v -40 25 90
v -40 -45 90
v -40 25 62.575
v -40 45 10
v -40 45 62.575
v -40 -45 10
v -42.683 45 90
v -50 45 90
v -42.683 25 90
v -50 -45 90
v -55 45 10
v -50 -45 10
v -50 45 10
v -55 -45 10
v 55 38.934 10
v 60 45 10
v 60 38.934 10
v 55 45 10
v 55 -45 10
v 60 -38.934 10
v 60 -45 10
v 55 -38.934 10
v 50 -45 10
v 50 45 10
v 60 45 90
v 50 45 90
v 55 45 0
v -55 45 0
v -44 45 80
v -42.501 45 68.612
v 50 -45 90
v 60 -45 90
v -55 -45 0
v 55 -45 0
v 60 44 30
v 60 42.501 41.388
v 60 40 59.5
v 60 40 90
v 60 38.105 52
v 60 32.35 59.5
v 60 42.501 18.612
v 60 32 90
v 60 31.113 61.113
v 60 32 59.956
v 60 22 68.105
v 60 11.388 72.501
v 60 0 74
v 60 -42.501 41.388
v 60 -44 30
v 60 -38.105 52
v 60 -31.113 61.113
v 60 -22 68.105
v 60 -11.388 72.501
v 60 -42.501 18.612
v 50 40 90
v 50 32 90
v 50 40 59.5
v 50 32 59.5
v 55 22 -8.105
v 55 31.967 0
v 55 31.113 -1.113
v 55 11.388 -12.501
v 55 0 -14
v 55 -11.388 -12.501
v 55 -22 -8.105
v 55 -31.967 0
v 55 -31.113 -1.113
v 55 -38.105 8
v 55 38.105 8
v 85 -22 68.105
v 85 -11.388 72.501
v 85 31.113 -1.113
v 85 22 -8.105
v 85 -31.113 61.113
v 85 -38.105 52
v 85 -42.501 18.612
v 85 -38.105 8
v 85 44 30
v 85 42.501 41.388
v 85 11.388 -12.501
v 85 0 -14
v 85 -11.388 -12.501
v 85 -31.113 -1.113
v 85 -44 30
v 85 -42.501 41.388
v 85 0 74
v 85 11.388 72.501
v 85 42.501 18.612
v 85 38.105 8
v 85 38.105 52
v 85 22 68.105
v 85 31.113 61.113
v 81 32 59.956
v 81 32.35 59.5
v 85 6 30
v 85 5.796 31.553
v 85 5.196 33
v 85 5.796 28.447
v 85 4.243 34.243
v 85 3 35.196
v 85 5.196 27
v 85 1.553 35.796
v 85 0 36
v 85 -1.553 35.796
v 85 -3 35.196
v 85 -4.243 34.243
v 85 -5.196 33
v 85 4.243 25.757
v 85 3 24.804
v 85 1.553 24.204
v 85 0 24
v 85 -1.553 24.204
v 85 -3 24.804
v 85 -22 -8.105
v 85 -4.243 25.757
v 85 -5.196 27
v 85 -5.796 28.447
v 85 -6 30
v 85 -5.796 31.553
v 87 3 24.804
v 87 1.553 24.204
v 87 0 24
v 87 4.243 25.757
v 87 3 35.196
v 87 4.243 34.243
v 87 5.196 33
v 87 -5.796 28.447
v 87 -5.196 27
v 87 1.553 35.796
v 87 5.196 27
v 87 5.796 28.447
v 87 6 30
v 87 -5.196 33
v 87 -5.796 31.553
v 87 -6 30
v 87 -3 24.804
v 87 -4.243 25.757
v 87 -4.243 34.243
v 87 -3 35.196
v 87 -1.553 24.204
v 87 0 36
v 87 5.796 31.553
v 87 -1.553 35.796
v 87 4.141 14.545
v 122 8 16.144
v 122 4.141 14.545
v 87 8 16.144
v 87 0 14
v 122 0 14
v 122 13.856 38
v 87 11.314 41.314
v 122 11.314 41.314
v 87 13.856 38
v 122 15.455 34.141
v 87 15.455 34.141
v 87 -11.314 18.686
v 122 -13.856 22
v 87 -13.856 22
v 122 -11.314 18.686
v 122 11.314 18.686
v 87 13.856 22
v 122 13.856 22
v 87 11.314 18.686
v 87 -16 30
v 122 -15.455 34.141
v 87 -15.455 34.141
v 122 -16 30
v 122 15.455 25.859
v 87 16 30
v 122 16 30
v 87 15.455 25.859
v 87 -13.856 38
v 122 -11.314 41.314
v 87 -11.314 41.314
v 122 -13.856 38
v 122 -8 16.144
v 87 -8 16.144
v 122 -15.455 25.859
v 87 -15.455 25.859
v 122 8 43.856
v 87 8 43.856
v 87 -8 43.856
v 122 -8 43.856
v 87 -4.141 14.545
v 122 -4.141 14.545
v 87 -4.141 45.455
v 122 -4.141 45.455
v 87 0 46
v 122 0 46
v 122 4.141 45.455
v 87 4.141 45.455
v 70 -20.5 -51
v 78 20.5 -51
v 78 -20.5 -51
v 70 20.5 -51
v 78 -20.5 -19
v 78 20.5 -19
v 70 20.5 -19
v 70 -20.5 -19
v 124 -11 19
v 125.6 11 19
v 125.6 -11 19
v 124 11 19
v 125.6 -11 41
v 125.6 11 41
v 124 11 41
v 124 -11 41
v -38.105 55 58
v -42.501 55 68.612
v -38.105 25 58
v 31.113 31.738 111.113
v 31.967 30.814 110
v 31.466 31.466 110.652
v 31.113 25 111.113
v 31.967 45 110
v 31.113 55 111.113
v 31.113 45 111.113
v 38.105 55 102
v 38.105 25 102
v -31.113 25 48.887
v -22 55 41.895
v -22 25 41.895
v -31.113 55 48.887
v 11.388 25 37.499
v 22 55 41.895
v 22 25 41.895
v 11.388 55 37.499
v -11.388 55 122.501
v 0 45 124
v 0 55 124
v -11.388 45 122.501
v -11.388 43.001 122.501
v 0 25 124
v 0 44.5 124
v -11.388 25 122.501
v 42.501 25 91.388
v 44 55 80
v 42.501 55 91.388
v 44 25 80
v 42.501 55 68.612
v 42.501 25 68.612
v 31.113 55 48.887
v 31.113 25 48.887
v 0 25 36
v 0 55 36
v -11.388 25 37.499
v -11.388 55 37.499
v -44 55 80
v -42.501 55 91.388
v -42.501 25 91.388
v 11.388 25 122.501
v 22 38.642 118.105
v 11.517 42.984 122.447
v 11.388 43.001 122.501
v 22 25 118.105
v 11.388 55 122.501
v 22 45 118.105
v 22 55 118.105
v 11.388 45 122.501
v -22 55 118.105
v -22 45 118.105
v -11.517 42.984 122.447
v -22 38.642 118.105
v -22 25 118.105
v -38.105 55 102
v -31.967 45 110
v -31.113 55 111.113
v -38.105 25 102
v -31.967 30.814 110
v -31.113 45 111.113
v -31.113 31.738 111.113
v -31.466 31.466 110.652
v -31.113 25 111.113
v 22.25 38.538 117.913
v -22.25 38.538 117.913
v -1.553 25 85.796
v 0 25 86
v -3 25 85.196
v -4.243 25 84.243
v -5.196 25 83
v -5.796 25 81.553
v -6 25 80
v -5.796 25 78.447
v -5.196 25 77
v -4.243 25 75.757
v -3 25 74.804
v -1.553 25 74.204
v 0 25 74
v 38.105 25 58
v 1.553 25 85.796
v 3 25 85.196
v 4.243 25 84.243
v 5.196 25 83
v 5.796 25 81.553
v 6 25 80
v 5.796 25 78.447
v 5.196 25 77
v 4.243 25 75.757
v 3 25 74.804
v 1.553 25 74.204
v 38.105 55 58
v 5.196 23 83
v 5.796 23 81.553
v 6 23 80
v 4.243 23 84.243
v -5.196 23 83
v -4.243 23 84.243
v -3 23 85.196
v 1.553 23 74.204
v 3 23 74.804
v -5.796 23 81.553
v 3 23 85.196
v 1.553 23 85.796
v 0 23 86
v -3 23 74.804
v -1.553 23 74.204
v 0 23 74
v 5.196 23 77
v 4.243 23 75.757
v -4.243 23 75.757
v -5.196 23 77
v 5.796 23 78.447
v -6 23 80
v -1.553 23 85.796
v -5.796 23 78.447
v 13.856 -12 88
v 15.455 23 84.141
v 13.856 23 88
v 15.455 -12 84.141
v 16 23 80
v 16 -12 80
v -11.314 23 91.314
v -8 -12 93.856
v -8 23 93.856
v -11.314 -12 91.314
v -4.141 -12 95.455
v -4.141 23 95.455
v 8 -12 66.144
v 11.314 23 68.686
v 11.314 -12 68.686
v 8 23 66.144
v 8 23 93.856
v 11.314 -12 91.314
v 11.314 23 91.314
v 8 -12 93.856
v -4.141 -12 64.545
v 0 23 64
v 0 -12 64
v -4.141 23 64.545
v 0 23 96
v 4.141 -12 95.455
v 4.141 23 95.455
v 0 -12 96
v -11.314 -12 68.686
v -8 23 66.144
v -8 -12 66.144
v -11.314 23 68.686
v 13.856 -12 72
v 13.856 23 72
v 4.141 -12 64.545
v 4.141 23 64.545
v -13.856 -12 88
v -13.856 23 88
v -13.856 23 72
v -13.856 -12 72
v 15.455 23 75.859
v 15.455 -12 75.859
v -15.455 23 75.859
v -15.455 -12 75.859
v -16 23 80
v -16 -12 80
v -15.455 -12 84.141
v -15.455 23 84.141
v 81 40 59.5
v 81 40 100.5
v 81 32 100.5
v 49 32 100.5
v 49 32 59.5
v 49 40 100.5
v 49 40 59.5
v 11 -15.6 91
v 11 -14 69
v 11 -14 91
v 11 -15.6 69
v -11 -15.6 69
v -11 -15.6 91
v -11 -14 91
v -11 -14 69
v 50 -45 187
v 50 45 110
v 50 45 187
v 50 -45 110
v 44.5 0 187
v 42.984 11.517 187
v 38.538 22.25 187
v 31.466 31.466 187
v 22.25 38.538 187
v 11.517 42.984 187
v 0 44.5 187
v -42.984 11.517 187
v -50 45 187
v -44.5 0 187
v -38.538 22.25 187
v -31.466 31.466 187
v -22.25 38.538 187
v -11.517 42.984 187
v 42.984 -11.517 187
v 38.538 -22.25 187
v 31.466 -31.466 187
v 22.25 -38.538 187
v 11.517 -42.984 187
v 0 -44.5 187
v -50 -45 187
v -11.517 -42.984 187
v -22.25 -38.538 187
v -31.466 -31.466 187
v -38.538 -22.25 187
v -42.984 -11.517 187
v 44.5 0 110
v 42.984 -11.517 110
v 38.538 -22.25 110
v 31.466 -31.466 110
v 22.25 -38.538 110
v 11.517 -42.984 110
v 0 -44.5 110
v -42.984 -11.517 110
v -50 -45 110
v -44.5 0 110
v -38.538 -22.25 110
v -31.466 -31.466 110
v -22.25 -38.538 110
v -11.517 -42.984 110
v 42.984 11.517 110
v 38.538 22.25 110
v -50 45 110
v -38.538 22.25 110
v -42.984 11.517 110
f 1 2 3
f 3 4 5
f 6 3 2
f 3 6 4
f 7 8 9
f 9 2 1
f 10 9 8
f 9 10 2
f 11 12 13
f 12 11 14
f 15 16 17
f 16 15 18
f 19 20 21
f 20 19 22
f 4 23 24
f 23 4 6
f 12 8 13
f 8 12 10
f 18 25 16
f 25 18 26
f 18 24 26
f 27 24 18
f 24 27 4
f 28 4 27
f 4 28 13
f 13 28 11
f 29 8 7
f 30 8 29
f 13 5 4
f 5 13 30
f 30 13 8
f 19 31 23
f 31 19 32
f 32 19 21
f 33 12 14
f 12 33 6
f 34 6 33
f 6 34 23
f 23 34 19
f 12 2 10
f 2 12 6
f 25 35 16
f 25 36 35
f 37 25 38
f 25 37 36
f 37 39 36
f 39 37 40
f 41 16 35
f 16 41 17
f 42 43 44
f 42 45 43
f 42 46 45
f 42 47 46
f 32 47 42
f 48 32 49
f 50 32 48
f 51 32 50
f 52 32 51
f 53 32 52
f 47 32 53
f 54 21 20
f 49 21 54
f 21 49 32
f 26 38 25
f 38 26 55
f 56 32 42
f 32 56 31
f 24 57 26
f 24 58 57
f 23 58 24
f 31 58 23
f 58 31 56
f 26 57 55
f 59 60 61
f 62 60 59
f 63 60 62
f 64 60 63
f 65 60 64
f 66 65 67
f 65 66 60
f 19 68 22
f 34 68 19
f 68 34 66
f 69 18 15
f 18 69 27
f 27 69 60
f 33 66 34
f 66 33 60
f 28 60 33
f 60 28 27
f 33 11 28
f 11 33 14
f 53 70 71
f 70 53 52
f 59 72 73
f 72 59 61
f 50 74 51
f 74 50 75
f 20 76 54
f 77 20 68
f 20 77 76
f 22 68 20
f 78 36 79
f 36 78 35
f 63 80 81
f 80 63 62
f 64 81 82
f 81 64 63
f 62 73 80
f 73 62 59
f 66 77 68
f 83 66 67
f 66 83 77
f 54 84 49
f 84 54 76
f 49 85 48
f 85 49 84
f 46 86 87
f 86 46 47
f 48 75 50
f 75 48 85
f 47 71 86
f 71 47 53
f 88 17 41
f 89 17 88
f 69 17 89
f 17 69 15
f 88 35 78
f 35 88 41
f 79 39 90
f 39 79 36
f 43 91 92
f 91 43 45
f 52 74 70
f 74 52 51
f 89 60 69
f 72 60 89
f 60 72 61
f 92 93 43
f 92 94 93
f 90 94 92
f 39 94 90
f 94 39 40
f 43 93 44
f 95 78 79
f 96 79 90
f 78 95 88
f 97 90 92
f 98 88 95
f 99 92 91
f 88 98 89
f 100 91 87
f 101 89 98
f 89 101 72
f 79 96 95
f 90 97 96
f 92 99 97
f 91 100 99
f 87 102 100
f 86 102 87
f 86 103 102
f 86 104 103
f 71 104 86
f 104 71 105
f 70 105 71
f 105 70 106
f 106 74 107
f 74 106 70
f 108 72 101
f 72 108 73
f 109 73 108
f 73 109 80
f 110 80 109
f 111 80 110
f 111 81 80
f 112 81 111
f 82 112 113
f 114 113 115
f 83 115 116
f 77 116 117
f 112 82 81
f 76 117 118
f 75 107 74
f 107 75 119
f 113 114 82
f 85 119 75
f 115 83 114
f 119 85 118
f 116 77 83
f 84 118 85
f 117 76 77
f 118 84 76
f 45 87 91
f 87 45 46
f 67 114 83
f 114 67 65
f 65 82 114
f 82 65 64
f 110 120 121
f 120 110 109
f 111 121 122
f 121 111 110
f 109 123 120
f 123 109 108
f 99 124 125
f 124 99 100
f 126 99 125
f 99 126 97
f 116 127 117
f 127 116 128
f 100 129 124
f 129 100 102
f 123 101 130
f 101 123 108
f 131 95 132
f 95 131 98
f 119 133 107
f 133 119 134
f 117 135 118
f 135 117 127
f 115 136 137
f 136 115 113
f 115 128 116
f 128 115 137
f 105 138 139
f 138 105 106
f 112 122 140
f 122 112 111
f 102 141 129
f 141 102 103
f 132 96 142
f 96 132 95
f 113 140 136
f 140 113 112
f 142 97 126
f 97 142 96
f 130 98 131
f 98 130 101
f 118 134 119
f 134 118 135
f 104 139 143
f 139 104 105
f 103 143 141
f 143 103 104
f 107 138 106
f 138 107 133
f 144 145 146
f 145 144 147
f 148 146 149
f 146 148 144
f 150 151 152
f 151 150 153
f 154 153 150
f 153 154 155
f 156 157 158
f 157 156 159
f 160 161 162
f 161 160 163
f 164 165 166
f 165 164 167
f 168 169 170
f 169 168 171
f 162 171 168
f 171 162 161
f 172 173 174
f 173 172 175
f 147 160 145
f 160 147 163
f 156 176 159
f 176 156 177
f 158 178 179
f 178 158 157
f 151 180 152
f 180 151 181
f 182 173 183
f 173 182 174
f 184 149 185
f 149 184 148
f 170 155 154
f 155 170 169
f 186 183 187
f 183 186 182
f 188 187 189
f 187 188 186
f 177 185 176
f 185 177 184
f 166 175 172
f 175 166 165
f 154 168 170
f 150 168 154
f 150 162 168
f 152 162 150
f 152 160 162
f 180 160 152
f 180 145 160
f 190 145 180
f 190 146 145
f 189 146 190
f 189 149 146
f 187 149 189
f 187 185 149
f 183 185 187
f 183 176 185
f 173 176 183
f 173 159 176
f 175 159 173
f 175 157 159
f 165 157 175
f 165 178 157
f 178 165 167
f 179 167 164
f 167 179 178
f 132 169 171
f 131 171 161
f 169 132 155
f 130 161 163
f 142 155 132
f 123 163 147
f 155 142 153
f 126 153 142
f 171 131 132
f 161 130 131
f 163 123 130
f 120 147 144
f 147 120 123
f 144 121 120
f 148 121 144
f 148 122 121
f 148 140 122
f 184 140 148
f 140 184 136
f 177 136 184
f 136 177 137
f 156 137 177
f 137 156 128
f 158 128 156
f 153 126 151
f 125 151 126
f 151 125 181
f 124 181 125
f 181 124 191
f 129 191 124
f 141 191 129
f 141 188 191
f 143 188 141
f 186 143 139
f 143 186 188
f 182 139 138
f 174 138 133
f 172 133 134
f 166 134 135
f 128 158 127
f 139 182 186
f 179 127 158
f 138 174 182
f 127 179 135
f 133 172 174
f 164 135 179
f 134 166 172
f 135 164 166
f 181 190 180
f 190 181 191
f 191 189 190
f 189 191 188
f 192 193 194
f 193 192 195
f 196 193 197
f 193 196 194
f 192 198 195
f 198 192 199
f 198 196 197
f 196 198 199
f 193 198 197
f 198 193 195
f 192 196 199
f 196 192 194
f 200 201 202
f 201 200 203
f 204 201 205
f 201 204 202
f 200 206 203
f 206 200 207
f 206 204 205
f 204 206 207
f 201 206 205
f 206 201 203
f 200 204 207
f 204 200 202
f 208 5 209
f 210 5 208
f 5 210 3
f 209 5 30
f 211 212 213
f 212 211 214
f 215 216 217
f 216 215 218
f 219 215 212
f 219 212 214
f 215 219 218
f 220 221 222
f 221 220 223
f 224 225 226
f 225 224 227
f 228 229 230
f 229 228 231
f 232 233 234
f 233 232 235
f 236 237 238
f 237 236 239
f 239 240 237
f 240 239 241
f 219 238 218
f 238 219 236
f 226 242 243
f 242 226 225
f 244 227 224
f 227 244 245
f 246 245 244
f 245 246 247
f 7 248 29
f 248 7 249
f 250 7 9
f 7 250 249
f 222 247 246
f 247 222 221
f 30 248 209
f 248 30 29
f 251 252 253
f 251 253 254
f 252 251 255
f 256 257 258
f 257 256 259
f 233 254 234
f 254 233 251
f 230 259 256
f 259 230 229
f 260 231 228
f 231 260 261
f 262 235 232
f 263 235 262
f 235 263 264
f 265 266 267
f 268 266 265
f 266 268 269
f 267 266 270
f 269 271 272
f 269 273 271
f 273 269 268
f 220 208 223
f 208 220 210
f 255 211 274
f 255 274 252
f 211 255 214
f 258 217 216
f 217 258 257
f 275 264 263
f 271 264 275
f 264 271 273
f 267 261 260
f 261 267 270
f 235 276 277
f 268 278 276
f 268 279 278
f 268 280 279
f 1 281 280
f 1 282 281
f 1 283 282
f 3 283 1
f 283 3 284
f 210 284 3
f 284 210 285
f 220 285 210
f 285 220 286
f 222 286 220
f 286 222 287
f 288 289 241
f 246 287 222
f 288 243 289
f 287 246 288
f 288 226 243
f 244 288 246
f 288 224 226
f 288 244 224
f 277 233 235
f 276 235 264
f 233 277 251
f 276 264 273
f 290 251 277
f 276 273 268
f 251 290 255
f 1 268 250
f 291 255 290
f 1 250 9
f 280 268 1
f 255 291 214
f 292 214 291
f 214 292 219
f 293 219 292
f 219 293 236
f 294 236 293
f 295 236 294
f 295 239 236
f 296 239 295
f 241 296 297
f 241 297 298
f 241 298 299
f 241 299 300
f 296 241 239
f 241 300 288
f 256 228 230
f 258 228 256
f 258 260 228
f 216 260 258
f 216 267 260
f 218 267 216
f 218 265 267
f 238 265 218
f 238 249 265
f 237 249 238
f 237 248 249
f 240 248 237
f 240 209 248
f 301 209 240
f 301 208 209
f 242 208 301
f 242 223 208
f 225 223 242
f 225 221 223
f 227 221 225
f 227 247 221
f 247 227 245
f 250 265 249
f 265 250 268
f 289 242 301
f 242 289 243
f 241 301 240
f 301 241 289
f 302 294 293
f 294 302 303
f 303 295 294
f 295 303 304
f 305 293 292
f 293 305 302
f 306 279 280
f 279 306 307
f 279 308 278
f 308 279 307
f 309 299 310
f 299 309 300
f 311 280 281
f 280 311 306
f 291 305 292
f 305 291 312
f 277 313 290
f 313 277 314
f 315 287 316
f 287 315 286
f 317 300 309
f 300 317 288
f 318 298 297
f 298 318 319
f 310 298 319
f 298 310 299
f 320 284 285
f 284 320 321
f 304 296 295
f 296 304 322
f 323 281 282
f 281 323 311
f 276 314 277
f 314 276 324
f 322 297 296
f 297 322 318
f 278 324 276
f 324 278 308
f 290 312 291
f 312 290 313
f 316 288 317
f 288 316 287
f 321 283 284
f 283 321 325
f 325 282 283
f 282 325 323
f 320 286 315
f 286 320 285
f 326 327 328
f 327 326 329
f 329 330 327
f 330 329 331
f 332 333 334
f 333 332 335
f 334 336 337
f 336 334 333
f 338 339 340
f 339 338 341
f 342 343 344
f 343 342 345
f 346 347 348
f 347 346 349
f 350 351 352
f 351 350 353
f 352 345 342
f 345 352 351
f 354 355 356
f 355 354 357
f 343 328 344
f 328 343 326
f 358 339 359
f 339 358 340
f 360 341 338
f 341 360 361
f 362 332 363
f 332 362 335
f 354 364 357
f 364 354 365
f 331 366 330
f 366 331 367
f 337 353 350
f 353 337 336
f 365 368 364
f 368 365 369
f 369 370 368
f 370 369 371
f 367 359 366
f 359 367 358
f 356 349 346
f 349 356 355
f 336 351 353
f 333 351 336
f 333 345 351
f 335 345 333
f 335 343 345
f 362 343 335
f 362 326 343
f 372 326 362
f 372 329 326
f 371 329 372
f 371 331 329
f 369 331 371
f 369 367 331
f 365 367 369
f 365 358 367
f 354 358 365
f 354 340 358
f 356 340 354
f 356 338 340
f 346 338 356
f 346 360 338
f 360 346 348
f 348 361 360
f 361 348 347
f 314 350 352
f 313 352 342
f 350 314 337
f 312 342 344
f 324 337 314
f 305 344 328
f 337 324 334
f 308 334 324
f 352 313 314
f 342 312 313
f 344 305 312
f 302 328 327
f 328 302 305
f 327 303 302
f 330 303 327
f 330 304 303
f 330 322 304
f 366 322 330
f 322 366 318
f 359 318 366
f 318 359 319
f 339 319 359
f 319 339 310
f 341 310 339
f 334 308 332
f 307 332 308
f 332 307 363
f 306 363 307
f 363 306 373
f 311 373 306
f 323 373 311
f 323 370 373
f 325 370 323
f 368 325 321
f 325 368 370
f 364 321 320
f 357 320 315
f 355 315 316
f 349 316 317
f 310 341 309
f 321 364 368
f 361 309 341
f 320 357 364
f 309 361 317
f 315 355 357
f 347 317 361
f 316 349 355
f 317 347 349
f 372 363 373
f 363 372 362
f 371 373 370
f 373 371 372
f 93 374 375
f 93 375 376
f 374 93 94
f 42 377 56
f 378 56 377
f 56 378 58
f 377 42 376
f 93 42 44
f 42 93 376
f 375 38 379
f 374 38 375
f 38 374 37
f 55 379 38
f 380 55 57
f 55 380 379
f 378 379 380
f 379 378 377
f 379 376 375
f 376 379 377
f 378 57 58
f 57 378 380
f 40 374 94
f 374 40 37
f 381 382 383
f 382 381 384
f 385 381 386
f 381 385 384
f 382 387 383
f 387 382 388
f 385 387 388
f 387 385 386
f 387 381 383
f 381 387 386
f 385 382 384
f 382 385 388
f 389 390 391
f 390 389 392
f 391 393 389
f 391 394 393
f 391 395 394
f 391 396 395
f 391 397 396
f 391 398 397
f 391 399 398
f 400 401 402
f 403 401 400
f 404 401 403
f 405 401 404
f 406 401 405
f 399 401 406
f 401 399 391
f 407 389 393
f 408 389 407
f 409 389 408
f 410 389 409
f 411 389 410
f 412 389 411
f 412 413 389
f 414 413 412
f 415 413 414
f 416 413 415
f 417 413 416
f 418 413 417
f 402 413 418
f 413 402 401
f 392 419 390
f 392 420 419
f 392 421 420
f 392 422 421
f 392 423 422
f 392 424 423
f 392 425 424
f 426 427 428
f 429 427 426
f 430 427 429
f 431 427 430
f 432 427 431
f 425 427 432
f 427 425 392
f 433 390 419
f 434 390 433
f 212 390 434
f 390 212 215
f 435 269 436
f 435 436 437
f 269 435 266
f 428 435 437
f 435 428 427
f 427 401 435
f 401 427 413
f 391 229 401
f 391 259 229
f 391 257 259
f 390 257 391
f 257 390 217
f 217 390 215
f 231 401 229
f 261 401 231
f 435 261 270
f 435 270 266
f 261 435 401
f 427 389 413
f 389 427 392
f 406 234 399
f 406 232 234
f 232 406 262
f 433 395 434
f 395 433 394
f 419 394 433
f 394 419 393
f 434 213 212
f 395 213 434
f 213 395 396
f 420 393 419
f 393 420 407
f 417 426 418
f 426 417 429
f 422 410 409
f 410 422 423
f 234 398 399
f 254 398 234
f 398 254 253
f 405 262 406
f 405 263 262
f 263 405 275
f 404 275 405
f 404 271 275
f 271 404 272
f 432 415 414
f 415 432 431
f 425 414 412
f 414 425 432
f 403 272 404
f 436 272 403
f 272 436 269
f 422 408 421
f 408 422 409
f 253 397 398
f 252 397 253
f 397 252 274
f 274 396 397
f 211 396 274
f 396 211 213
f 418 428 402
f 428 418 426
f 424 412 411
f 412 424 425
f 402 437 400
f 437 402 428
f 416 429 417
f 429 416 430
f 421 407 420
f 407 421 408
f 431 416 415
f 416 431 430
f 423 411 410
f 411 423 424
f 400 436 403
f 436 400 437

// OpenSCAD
// ankle.scad
// Free Humanoid Platform — Leg v0.1 — ankle 2-DoF QDD stack
//
// Serial 2-DoF cluster: pitch (sagittal) → roll (frontal). Each axis is a
// quasi-direct-drive (QDD) actuator: T-Motor U8 Lite KV150 outrunner BLDC
// (BOM ankle_*_qdd_motor) + Maxon GP 32 HP single-stage planetary 6.6:1
// (BOM ankle_*_qdd_planetary) + Moteus c1 (BOM ankle_*_controller) +
// AS5048A position sensor.
//
// Corpus: mini-cheetah (2019), cassie-osu, mit-cheetah-2 (2014).
// REFERENCE GEOMETRY — NOT VALIDATED BY PHYSICAL BUILD.

include <leg_params.scad>;

// --------------------------------------------------------------------------
// qdd_motor_envelope() — T-Motor U8 Lite outrunner (pancake form)
// --------------------------------------------------------------------------
module qdd_motor_envelope() {
    color("DarkOliveGreen")
        cylinder(h = qdd_motor_length, d = qdd_motor_od, center = false);
    // Output shaft
    color("Goldenrod")
        translate([0, 0, qdd_motor_length])
            cylinder(h = 8.0, d = qdd_motor_shaft_d, center = false);
}

// --------------------------------------------------------------------------
// qdd_planetary_envelope() — Maxon GP 32 HP 6.6:1
// --------------------------------------------------------------------------
module qdd_planetary_envelope() {
    color("DarkSlateGray")
        cylinder(h = qdd_planetary_length, d = qdd_planetary_od,
                  center = false);
}

// --------------------------------------------------------------------------
// moteus_c1_envelope() — small box on housing
// --------------------------------------------------------------------------
module moteus_c1_envelope() {
    color("ForestGreen")
        cube([moteus_c1_w, moteus_c1_l, moteus_c1_h], center = false);
}

// --------------------------------------------------------------------------
// ankle_pitch_housing() — milled aluminum 6061 (BOM ankle_pitch_housing)
// --------------------------------------------------------------------------
module ankle_pitch_housing() {
    color("Silver", 0.4)
    difference() {
        // Outer shell (rectangular bracket form)
        translate([-50, -45, 0])
            cube([100, 90, qdd_motor_length + qdd_planetary_length + 12]);
        // Hollow for motor + planetary
        translate([0, 0, -0.1])
            cylinder(h = qdd_motor_length + qdd_planetary_length + 12.2,
                     d = qdd_motor_od + 1.0, center = false);
    }
}

// --------------------------------------------------------------------------
// ankle_roll_yoke() — U-shape yoke (BOM ankle_roll_housing)
// --------------------------------------------------------------------------
module ankle_roll_yoke() {
    yoke_w = 110.0;
    yoke_l = 90.0;
    yoke_t = 10.0;
    arm_h  = qdd_motor_length + qdd_planetary_length + 15.0;

    color("Silver", 0.5)
    union() {
        // Bottom plate (mates to FT sensor / foot plate)
        translate([-yoke_w / 2, -yoke_l / 2, 0])
            cube([yoke_w, yoke_l, yoke_t]);
        // Two side arms (vertical), each holding one bearing for the
        // pitch-axis rotation
        for (sx = [-1, 1]) {
            translate([sx * (yoke_w / 2 - yoke_t / 2),
                       -yoke_l / 2, yoke_t])
                cube([yoke_t, yoke_l, arm_h]);
        }
    }
}

// --------------------------------------------------------------------------
// ankle_pitch_qdd() — single QDD stack for ankle-pitch
// --------------------------------------------------------------------------
module ankle_pitch_qdd() {
    // Motor
    qdd_motor_envelope();
    // Planetary stacked on top of motor (with shaft adapter — abstracted)
    translate([0, 0, qdd_motor_length + 2.0])
        qdd_planetary_envelope();
    // Moteus c1 on side of housing
    translate([qdd_motor_od / 2 + 5.0, -moteus_c1_l / 2,
               qdd_motor_length / 2])
        moteus_c1_envelope();
    // AS5048A on planetary output side
    translate([-as5048_pcb_w / 2, -as5048_pcb_l / 2,
               qdd_motor_length + qdd_planetary_length + 4.0])
        color("DarkRed")
            cube([as5048_pcb_w, as5048_pcb_l, as5048_pcb_h]);
}

// --------------------------------------------------------------------------
// ankle() — full 2-DoF ankle cluster
//   Pitch axis (Y, sagittal) is innermost (closer to tibia).
//   Roll axis (X, frontal) is outermost (closer to foot plate).
//   Axes intersect at the ankle center (~30 mm above the FT-sensor flange).
// --------------------------------------------------------------------------
module ankle() {
    // Roll yoke at base (mates to foot plate / FT sensor)
    ankle_roll_yoke();
    // Roll-axis QDD (mounted in one of the yoke arms, axis along +X)
    translate([55, 0, 30])
        rotate([0, 90, 0])
            ankle_pitch_qdd();
    // Pitch-axis QDD (mounted above the roll yoke, axis along +Y)
    translate([0, 55, 80])
        rotate([90, 0, 0])
            ankle_pitch_qdd();
    // Ankle-pitch housing (between pitch QDD and tibia end-cap)
    translate([0, 0, 110])
        ankle_pitch_housing();
}

// --------------------------------------------------------------------------
// Demo render
// --------------------------------------------------------------------------
echo(str("ankle.scad: pitch peak ", ankle_pitch_peak_torque_nm,
          " N·m, roll peak ", ankle_roll_peak_torque_nm,
          " N·m, ratio ", qdd_ratio, ":1"));
ankle();
